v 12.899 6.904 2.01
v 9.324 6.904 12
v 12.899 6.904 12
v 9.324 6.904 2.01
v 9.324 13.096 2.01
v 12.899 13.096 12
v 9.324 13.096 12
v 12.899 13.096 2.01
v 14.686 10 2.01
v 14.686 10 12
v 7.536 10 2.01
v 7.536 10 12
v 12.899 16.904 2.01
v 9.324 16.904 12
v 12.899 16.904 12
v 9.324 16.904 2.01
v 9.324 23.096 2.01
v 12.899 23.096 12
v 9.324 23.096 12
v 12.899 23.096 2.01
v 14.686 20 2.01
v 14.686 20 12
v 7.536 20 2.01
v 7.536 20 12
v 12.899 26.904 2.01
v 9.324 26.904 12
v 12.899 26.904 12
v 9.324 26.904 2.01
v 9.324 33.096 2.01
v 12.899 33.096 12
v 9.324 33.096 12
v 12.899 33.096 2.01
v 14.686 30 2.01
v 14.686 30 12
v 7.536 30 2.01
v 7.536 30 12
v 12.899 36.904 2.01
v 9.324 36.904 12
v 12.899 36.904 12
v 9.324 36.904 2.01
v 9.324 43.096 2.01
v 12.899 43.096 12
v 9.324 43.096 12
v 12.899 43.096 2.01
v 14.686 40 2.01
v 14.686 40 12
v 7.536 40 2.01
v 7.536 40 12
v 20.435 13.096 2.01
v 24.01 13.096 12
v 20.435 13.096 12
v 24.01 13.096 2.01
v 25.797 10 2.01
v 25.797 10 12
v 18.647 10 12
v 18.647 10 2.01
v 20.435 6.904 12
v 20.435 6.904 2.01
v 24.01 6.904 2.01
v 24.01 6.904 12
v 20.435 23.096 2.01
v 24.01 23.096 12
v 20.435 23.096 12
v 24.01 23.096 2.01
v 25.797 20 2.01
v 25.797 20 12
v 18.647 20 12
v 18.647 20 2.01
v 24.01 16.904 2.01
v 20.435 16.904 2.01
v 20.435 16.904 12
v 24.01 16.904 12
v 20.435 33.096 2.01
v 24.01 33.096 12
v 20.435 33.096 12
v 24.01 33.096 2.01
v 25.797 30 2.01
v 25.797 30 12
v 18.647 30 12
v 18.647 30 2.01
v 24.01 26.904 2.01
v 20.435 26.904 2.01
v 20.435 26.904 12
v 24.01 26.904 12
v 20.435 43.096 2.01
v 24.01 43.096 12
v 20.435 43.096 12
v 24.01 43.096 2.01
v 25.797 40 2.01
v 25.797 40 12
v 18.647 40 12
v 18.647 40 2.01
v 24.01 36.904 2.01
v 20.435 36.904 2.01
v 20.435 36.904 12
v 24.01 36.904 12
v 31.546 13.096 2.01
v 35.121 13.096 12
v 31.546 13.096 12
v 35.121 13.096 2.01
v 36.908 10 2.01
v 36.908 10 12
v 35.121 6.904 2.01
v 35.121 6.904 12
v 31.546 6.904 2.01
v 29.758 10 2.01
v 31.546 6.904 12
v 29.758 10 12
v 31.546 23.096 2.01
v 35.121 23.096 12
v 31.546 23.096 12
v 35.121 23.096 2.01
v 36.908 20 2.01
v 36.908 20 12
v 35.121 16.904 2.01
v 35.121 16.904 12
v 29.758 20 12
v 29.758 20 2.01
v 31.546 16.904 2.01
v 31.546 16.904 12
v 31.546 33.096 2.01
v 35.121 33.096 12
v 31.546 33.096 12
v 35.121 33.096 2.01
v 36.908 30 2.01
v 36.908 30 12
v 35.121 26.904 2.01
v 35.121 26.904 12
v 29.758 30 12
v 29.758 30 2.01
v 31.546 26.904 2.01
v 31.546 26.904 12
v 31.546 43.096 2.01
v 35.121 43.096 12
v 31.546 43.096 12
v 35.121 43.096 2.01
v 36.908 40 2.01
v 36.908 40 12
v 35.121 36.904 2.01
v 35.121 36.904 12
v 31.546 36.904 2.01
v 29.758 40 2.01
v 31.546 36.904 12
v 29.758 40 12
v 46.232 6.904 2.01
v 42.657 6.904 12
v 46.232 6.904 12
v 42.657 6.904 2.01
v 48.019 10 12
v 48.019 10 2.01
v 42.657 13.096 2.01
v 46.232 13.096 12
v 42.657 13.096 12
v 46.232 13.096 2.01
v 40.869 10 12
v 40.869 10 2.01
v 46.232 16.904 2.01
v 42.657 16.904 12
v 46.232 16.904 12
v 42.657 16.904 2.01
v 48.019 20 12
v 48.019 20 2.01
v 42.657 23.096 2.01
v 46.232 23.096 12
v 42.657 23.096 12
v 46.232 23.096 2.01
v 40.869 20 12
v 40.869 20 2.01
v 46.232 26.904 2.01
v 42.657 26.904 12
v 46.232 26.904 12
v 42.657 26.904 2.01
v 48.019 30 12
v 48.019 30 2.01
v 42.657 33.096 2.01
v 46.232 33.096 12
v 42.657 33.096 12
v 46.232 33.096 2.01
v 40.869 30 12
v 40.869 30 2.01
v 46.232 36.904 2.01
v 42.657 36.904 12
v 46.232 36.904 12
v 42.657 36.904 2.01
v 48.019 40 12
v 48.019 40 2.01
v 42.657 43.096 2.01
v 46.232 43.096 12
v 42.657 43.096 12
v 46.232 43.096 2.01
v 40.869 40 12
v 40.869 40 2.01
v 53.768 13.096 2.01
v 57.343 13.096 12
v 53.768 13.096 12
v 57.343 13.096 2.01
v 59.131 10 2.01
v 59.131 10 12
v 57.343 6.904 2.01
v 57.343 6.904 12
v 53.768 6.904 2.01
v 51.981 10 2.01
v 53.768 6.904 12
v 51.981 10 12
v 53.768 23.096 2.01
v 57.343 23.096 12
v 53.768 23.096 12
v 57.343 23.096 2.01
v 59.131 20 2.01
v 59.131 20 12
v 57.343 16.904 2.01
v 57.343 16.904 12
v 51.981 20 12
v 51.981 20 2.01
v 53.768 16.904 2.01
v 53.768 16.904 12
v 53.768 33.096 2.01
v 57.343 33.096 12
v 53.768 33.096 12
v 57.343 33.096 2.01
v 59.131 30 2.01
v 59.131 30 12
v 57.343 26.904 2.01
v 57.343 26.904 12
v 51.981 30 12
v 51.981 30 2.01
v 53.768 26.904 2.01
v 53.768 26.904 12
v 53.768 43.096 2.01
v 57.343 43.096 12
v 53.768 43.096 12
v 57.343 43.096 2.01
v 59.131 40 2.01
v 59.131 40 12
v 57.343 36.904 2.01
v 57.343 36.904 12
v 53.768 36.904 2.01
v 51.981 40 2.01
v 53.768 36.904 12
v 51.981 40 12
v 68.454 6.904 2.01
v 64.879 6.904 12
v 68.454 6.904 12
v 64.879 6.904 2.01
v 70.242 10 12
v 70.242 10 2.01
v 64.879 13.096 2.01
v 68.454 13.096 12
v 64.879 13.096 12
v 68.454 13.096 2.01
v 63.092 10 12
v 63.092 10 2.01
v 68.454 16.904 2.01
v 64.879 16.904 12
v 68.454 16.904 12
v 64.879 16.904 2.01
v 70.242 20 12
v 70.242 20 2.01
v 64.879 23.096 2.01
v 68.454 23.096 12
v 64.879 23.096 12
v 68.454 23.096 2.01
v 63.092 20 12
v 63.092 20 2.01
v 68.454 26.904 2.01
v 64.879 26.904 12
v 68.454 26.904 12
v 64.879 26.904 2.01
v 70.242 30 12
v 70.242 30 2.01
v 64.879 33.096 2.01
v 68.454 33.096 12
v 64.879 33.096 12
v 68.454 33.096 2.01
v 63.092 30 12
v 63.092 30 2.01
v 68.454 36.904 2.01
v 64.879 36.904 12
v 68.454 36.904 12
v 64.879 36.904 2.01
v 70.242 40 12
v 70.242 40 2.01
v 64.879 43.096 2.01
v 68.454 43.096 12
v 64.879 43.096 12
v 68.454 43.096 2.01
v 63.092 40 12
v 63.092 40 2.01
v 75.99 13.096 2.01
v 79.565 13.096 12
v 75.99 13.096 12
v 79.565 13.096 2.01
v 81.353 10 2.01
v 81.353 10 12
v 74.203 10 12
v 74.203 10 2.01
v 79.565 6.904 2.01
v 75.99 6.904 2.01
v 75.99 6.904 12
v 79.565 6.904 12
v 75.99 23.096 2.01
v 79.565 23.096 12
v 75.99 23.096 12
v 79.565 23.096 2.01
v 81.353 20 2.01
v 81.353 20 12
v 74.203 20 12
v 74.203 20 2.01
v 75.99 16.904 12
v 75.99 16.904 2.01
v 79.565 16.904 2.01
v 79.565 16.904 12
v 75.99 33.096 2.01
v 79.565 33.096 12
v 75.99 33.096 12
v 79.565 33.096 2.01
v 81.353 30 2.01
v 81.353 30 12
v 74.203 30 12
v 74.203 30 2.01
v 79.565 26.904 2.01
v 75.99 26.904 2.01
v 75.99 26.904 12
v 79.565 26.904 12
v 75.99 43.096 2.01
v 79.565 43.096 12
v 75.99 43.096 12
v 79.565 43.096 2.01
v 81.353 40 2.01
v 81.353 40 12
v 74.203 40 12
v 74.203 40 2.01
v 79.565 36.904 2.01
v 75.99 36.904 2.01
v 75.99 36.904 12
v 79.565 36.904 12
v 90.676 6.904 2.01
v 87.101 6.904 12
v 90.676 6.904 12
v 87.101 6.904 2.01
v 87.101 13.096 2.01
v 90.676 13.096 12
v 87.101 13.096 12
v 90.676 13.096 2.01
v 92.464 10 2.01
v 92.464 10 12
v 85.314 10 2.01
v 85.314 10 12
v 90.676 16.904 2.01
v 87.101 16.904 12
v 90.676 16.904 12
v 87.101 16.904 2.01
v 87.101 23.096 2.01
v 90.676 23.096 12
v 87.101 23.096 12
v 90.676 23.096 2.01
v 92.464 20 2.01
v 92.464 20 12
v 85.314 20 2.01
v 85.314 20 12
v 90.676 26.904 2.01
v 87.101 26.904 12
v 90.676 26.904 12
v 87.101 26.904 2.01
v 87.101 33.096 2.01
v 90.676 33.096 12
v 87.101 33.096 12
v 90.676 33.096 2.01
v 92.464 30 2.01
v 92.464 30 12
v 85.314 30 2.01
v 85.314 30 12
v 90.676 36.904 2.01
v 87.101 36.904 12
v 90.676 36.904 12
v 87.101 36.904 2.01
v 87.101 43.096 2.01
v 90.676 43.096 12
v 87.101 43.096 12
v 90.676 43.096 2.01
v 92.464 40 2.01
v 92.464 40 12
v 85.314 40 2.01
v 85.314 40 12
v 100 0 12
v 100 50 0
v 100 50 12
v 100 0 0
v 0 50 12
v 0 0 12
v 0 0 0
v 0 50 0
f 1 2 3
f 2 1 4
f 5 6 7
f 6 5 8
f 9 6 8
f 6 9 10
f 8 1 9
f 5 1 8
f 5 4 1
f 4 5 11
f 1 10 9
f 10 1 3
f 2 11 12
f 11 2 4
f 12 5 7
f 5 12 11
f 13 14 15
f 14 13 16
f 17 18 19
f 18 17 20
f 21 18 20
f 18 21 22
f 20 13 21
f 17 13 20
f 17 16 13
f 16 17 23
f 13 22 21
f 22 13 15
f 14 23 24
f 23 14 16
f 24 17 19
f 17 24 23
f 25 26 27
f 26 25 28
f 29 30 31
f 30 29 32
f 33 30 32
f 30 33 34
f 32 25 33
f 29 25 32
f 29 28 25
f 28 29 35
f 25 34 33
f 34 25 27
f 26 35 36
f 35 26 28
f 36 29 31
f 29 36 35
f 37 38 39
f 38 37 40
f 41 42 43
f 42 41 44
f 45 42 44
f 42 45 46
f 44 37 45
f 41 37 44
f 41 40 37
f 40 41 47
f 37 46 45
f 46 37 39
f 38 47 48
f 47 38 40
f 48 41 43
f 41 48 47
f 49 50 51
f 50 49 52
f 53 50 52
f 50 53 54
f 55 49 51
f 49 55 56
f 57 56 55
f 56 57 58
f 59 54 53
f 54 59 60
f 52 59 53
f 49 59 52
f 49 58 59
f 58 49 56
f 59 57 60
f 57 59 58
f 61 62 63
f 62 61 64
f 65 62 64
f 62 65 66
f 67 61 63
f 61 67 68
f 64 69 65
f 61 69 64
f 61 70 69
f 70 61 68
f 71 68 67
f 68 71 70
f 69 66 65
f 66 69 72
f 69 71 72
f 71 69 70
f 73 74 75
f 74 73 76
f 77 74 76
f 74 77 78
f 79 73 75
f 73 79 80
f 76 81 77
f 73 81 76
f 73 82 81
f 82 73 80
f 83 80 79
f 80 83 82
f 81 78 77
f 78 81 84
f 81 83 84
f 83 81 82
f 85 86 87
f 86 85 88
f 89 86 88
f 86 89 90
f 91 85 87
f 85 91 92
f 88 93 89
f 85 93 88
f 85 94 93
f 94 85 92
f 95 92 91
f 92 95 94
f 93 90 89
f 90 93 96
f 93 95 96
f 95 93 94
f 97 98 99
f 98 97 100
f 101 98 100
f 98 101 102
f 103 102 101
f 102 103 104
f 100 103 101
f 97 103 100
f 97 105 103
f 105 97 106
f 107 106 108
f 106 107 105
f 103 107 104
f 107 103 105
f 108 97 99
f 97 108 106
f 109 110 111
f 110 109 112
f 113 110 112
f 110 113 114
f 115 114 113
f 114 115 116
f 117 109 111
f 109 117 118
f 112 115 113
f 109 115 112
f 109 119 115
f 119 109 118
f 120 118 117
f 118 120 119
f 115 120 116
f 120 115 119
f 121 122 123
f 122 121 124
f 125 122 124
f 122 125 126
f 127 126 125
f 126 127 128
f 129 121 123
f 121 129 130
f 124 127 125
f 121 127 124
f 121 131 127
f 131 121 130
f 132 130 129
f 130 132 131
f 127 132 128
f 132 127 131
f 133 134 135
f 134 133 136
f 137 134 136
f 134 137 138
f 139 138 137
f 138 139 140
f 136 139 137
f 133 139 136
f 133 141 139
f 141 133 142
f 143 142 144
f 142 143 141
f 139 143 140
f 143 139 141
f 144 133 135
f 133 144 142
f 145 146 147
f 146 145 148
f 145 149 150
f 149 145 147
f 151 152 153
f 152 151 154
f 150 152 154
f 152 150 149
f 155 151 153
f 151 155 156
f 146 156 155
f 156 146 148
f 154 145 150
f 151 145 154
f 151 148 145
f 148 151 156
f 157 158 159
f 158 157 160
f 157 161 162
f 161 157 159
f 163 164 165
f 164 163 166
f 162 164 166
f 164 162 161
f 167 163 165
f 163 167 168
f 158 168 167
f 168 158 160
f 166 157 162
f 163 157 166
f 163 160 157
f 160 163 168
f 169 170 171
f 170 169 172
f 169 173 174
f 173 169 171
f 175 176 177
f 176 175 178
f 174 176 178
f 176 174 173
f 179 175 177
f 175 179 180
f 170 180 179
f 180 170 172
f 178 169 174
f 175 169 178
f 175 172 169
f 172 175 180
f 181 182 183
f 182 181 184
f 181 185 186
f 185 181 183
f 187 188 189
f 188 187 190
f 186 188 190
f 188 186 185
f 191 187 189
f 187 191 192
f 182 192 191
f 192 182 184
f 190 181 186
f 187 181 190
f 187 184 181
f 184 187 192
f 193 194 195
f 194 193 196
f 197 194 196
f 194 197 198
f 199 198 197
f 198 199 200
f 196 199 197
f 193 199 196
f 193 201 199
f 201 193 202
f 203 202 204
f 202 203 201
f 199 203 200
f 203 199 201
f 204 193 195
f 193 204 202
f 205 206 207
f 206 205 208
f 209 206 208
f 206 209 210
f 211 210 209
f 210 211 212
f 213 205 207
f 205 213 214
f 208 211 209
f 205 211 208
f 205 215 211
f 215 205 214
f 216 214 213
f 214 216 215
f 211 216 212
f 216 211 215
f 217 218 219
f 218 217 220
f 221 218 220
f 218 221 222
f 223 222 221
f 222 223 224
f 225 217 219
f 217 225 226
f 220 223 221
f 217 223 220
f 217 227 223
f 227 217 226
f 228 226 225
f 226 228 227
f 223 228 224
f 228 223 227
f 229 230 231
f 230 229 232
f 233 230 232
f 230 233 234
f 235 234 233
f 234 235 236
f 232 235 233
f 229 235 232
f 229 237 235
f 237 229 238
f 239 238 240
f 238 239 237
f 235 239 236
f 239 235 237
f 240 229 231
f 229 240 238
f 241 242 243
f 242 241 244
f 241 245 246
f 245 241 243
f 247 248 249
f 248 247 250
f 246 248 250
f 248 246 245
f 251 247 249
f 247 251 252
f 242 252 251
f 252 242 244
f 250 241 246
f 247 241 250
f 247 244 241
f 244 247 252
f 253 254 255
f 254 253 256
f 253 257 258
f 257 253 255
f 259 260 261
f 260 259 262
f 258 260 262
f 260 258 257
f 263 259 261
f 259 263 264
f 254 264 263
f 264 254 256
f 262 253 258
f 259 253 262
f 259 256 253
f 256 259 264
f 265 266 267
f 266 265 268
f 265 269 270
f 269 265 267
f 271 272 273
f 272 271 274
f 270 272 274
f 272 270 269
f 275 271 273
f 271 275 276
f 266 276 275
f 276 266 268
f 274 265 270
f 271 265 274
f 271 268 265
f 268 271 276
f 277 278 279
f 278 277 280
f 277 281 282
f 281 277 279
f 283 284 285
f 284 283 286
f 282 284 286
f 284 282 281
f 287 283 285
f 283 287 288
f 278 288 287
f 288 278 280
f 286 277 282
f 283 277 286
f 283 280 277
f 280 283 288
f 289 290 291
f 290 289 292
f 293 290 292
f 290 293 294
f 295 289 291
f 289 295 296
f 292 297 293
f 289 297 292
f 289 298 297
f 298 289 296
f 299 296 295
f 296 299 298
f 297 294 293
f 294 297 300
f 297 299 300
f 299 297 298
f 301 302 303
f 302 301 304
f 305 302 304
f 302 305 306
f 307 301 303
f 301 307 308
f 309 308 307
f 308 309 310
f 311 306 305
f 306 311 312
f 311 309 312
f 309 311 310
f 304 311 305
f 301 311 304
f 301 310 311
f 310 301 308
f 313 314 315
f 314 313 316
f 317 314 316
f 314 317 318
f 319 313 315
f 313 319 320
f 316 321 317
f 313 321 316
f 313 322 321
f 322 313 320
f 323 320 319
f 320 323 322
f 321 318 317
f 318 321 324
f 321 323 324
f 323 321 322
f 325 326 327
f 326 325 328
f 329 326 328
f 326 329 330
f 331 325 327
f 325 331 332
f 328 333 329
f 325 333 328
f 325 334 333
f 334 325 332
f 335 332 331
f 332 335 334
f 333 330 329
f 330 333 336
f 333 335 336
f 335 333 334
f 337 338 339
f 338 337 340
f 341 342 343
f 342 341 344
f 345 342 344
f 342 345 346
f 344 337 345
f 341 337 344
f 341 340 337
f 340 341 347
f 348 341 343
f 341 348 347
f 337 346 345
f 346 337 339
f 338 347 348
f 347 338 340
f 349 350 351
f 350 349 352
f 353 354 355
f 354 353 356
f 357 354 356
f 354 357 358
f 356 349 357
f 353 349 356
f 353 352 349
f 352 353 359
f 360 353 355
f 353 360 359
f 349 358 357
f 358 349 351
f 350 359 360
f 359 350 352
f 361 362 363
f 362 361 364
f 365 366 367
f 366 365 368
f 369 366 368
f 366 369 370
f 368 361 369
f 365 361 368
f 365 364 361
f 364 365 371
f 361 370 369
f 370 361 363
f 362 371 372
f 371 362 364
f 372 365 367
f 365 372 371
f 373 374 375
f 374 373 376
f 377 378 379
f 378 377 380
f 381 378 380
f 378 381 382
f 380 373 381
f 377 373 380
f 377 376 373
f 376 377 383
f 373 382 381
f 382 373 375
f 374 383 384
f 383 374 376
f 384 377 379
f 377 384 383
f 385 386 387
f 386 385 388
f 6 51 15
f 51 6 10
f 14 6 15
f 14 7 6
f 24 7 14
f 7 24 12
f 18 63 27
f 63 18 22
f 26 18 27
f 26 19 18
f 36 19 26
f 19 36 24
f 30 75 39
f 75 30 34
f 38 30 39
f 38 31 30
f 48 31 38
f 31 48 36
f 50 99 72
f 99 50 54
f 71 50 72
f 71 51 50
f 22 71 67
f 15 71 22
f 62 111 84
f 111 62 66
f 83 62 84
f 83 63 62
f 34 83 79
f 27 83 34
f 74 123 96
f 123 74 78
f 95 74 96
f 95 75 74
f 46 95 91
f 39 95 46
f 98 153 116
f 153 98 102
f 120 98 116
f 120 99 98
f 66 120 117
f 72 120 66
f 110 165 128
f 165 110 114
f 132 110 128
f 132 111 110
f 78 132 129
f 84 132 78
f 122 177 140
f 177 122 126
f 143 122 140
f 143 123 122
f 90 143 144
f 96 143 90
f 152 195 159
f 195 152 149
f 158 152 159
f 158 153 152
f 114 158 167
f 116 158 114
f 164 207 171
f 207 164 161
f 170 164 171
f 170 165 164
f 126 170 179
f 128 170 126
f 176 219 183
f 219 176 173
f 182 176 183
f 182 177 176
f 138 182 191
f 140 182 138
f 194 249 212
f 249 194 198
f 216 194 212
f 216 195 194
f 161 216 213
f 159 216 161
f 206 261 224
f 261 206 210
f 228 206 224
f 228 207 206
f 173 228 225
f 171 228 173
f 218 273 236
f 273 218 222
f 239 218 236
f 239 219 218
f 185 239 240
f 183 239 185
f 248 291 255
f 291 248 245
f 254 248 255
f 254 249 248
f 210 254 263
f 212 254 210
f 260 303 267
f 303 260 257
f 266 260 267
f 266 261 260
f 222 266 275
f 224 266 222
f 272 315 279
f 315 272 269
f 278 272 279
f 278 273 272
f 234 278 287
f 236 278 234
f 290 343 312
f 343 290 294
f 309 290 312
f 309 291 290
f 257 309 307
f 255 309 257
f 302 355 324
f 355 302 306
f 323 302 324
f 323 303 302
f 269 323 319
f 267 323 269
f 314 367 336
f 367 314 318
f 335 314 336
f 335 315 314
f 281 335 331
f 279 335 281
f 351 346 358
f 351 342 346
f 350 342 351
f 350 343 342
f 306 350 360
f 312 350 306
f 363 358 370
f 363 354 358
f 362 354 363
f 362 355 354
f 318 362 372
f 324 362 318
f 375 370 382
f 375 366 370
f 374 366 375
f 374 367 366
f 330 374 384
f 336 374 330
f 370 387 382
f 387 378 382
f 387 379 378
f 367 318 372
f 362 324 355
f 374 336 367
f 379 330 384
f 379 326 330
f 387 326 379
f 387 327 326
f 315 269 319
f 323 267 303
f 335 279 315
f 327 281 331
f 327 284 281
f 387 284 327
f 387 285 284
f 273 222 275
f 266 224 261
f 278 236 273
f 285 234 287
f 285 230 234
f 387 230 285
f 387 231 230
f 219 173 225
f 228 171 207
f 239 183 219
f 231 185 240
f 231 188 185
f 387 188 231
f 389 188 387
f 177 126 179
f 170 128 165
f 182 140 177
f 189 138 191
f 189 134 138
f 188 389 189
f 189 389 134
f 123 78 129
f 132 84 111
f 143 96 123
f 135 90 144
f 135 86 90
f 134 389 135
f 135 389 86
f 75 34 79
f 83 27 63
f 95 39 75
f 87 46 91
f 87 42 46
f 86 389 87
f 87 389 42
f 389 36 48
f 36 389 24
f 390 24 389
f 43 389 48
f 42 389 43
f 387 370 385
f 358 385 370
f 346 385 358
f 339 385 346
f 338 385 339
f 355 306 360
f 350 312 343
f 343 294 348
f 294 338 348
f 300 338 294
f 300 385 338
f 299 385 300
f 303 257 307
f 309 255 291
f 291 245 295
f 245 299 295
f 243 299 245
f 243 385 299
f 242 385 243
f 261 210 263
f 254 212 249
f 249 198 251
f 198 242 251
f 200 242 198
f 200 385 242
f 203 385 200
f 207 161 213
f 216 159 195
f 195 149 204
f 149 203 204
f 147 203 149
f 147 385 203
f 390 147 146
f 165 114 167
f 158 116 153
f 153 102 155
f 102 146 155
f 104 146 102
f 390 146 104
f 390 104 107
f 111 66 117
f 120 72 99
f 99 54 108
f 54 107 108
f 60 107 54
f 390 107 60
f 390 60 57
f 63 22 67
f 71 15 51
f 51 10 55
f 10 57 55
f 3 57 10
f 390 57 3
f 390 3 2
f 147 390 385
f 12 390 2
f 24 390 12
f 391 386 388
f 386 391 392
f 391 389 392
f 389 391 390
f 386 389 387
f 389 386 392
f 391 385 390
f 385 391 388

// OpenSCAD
//Dimension X
base_x = 100;
//Dimension Y
base_y = 50;
//Dimension Z (height)
base_z = 12;
//how many holes in the X dimension
columns = 8;
//how many holes in the Y dimension
rows = 4;
//depth of holes
depth = 10;
//distance from edges (0 for default spacing)
edge = 0;

module __Customizer_Limit__ () {}  // This actually works

run = 1;
//hex_depth = base_z - 1 + 0.01; //0.01 is just to make the 3d viewer show the hole correctly
hex_size = 7.15;
hex_spacing_x = base_x / (columns+1);
hex_spacing_y = base_y / (rows+1);



if(run == 1) {
    difference() {
        create_base();
        create_hex();
    } 
} else if (run == 2) {
    create_hex();
}

module create_base() {
    cube([base_x, base_y, base_z]);
}

module hex(hdepth) {
    $fn = 6;
    echo("hex:", hdepth)
    let (edge_space = (edge == 0) ? hex_spacing_x : edge) {
        //echo("e:", (edge > 0 ? edge : hex_spacing_x));
        echo("edge:", edge_space);
        for (x = [0:1:columns-1]) {
            for (y = [0:1:rows-1]) {
                translate([(hex_spacing_x*x)+hex_spacing_x, (hex_spacing_y*y)+hex_spacing_y, (base_z-hdepth)+0.01]) 
                    cylinder(h = hdepth, r = hex_size / 2);
            }
        }
    }
}

module create_hex() {
    if (depth > (base_z - 1 + 0.01)) {
        let (hex_depth = base_z - 1 + 0.01) {
            echo("a:", hex_depth);
            hex(hex_depth);
        }
    } else {
        let (hex_depth = depth) {
            echo("b:", hex_depth);
            hex(hex_depth);
        }
    }
}
